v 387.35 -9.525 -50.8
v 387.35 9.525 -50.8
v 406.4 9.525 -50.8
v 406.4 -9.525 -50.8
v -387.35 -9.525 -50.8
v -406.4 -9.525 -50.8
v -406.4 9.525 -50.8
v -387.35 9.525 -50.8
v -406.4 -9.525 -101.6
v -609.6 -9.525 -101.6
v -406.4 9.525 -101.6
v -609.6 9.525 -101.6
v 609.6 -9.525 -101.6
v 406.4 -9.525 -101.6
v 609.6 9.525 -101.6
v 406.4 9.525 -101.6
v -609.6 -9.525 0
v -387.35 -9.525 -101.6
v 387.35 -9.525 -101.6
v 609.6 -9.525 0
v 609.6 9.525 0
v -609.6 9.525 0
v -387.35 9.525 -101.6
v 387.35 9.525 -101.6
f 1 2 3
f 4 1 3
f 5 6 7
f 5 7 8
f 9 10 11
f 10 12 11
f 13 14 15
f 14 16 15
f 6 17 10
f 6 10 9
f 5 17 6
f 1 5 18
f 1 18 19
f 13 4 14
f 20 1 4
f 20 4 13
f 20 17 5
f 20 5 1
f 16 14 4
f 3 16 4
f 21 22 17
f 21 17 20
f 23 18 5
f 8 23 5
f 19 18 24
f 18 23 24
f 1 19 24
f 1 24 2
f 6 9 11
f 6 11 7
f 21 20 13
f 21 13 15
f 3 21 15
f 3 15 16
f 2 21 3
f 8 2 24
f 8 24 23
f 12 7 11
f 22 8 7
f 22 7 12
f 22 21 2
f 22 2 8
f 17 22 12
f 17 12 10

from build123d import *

# Parameters (mm, degrees)
F1_DEPTH = 101.6
F2_W     = 19.05
F2_H     = 50.8
F3_DEPTH = 25.4


with BuildPart() as f1:
    # F0 (on Top) → F1 (new body)
    with BuildSketch(Plane.XY):
        Polygon((609.6, -9.525), (609.6, 0), (609.6, 9.525), (-609.6, 9.525), (-609.6, 0), (-609.6, -9.525), align=None)
    extrude(amount=-F1_DEPTH)

    # F2 (on face) → F3 (cut)
    with BuildSketch(Plane.XZ.offset(9.525)):
        with Locations((-396.875, -76.2)):
            Rectangle(F2_W, F2_H)
        with Locations((396.875, -76.2)):
            Rectangle(F2_W, F2_H)
    extrude(amount=-F3_DEPTH, mode=Mode.SUBTRACT)


solid = f1.part
